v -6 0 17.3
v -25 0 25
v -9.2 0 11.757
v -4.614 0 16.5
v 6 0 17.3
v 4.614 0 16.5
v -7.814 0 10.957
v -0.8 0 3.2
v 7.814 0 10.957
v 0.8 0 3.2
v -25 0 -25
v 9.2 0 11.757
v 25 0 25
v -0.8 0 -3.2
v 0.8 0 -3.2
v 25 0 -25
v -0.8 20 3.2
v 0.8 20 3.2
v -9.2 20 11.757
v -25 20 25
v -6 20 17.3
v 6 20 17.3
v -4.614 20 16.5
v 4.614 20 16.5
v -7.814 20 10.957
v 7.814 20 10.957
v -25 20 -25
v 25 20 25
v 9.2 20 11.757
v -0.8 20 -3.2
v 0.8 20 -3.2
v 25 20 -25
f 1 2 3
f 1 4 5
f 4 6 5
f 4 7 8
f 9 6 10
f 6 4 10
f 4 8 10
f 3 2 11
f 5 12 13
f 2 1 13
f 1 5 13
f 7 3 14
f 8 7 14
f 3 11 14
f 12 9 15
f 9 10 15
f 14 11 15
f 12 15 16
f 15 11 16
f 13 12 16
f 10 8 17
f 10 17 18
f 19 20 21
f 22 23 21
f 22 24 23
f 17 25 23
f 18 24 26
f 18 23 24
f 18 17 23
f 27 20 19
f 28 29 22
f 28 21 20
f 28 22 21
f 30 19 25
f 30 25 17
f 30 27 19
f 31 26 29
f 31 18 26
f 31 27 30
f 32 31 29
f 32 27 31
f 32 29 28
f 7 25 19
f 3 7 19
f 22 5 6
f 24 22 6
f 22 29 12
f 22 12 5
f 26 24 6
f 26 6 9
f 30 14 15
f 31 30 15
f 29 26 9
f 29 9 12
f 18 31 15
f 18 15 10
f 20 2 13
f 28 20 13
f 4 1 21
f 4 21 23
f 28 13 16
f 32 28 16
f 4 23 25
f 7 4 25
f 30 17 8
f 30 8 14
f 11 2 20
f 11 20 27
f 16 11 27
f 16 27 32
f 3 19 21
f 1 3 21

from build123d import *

# Parameters (mm, degrees)
SKETCH_1_W          = 50
SKETCH_1_H          = 50
EXTRUDE_1_DEPTH     = 20
CUT_EXTRUDE_1_DEPTH = 20


with BuildPart() as part:
    # Эскиз1 → Бобышка-Вытянуть1 (new body)
    with BuildSketch(Plane(origin=(0, 0, 0), x_dir=(1, 0, 0), z_dir=(0, 1, 0))):
        Rectangle(SKETCH_1_W, SKETCH_1_H)
    extrude(amount=EXTRUDE_1_DEPTH)

    # Эскиз2 → Вырез-Вытянуть1 (cut)
    with BuildSketch(Plane(origin=(0, 20, 0), x_dir=(1, 0, 0), z_dir=(0, 1, 0))):
        Polygon((-0.8, 3.2), (0.8, 3.2), (0.8, -3.2), (0, -3.2), (-0.8, -3.2), align=None)
        Polygon((4.614359354, -16.5), (7.814359354, -10.957437416), (9.2, -11.757437416), (6, -17.3), align=None)
        Polygon((-6, -17.3), (-4.614359354, -16.5), (-7.814359354, -10.957437416), (-9.2, -11.757437416), align=None)
    extrude(amount=-CUT_EXTRUDE_1_DEPTH, mode=Mode.SUBTRACT)


solid = part.part
